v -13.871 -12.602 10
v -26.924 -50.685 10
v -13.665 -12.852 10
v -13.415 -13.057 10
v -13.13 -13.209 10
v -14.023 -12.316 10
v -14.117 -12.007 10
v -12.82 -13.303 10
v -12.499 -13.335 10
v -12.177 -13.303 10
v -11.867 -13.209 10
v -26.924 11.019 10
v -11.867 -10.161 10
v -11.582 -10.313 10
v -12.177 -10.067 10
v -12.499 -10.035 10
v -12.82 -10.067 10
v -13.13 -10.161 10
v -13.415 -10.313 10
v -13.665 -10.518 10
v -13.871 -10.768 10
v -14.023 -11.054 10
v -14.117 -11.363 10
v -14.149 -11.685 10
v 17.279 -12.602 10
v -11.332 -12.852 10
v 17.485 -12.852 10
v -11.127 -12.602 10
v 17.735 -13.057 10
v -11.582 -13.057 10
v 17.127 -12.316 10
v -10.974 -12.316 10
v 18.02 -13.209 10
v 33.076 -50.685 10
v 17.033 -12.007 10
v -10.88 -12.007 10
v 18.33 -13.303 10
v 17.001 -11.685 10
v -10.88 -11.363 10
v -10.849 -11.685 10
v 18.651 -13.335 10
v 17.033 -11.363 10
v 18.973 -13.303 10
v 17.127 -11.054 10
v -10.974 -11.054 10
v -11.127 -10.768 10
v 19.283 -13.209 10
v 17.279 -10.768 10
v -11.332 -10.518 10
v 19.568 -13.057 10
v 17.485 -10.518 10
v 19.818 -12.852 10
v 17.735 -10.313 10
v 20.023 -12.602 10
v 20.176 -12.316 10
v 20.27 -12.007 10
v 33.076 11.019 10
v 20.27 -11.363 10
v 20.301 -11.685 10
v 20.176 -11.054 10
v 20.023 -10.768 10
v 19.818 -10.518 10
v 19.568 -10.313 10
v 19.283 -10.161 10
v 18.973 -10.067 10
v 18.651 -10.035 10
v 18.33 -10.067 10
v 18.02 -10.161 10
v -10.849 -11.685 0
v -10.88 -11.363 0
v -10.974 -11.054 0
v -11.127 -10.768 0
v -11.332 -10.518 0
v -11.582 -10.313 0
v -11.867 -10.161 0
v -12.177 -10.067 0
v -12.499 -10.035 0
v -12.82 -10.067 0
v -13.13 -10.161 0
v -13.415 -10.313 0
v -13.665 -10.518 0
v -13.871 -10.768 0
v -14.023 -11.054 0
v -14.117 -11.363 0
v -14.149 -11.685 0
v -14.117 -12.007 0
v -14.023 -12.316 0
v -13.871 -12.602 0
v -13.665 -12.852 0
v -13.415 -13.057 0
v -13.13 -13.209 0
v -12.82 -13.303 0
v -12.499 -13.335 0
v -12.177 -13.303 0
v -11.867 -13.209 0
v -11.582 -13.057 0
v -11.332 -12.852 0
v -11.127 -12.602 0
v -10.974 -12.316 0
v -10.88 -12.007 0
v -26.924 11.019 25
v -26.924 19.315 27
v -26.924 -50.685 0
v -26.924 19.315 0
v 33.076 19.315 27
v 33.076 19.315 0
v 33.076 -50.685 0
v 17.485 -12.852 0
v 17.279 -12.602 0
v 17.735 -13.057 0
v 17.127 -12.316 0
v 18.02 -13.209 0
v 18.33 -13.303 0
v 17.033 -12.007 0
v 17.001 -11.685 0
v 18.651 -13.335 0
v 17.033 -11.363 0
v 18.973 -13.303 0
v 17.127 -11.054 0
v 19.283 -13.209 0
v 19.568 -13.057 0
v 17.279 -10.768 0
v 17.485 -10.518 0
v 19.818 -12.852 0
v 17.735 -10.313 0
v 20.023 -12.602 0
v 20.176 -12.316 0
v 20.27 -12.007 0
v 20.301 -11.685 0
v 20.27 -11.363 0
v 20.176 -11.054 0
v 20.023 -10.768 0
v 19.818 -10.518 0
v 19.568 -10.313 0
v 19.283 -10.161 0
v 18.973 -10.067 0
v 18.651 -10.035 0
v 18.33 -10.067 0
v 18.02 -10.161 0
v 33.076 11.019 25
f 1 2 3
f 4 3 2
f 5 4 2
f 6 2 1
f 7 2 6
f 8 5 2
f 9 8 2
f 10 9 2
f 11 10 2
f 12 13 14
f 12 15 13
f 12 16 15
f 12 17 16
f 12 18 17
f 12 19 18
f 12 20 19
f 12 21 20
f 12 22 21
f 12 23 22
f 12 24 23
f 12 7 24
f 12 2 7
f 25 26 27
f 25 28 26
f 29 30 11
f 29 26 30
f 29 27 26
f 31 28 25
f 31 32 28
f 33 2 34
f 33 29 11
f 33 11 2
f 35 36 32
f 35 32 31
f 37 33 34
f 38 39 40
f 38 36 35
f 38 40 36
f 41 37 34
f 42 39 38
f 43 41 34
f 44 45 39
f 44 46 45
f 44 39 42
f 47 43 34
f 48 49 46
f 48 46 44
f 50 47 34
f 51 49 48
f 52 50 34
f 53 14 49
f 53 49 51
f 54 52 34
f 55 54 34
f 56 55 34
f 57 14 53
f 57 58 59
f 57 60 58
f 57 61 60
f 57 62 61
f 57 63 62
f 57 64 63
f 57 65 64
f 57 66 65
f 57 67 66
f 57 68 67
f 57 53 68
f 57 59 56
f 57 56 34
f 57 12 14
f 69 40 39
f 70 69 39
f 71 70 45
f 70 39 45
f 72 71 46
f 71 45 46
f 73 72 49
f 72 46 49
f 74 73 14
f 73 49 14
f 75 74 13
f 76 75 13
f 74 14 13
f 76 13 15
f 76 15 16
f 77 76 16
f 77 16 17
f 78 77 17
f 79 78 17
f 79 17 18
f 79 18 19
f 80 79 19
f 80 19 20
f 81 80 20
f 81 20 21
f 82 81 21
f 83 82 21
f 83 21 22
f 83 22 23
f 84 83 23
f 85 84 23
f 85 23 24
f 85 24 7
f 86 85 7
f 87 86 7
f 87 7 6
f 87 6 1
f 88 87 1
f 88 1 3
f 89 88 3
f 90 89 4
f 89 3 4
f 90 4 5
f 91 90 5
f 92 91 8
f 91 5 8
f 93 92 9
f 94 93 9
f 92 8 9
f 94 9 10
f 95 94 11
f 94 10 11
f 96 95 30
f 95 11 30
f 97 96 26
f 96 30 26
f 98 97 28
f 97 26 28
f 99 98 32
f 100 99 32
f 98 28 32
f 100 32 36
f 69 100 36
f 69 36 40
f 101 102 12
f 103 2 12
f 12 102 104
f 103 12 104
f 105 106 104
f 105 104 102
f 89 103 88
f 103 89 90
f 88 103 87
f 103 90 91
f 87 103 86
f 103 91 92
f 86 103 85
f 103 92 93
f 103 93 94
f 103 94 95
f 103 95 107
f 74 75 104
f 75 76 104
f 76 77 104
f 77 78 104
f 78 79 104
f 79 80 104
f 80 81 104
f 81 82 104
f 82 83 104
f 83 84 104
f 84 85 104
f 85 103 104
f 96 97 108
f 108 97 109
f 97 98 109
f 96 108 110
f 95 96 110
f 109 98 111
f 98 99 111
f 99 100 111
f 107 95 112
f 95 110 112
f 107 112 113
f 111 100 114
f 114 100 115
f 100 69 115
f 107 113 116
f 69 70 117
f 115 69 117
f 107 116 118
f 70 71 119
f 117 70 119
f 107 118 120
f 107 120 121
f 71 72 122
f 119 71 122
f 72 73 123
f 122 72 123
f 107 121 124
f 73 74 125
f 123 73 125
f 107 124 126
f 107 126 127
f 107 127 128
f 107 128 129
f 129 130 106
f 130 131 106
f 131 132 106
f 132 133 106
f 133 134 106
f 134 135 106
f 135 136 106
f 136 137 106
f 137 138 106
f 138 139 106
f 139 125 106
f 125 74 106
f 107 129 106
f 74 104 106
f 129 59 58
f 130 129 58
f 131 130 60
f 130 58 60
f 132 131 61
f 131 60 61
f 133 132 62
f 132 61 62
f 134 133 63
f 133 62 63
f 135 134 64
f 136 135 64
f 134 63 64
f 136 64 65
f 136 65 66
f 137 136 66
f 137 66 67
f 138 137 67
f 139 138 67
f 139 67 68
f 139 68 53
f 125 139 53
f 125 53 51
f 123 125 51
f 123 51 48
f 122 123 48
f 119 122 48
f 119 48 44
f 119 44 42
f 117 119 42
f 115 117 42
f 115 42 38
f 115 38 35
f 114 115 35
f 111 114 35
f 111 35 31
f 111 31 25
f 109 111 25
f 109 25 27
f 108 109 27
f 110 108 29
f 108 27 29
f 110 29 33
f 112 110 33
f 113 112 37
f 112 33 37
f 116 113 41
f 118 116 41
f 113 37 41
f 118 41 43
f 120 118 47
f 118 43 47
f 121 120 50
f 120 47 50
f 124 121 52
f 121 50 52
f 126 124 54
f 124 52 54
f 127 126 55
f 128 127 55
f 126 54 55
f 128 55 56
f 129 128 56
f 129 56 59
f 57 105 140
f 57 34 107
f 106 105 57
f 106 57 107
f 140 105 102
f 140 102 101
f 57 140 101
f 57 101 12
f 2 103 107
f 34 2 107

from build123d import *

# Parameters (mm, degrees)
ESQUISSE1_W           = 60
ESQUISSE1_H           = 70
BOSS_EXTRU_1_DEPTH    = 10
BOSS_EXTRU_2_DEPTH    = 60
TROU_TARAUD_M41_D     = 3.3
TROU_TARAUD_M41_DEPTH = 11.5
TROU_TARAUD_M41_TIP   = 0.991420021


with BuildPart() as part:
    # Esquisse1 → Boss.-Extru.1 (new body)
    with BuildSketch(Plane.XY):
        with Locations((3.076402568, -15.684931507)):
            Rectangle(ESQUISSE1_W, ESQUISSE1_H)
    extrude(amount=BOSS_EXTRU_1_DEPTH)

    # Esquisse2 → Boss.-Extru.2 (add)
    with BuildSketch(Plane(origin=(33.076402568, 0, 0), x_dir=(0, 0, -1), z_dir=(1, 0, 0))):
        Polygon((-27, 19.315068493), (-25, 11.018826061), (-10, 11.018826061), (-10, 19.315068493), align=None)
    extrude(amount=-BOSS_EXTRU_2_DEPTH)

    # Trou taraudé M41
    with Locations(Plane(origin=(18.651402568, -11.684931507, 0), x_dir=(-1, 0, 0), z_dir=(0, 0, -1))):
        with Locations((0, 0), (31.15, 0)):
            Hole(TROU_TARAUD_M41_D / 2, depth=TROU_TARAUD_M41_DEPTH)
            with Locations((0, 0, -(TROU_TARAUD_M41_DEPTH + TROU_TARAUD_M41_TIP / 2))):  # 118° drill point
                Cone(0, TROU_TARAUD_M41_D / 2, TROU_TARAUD_M41_TIP, mode=Mode.SUBTRACT)


solid = part.part
